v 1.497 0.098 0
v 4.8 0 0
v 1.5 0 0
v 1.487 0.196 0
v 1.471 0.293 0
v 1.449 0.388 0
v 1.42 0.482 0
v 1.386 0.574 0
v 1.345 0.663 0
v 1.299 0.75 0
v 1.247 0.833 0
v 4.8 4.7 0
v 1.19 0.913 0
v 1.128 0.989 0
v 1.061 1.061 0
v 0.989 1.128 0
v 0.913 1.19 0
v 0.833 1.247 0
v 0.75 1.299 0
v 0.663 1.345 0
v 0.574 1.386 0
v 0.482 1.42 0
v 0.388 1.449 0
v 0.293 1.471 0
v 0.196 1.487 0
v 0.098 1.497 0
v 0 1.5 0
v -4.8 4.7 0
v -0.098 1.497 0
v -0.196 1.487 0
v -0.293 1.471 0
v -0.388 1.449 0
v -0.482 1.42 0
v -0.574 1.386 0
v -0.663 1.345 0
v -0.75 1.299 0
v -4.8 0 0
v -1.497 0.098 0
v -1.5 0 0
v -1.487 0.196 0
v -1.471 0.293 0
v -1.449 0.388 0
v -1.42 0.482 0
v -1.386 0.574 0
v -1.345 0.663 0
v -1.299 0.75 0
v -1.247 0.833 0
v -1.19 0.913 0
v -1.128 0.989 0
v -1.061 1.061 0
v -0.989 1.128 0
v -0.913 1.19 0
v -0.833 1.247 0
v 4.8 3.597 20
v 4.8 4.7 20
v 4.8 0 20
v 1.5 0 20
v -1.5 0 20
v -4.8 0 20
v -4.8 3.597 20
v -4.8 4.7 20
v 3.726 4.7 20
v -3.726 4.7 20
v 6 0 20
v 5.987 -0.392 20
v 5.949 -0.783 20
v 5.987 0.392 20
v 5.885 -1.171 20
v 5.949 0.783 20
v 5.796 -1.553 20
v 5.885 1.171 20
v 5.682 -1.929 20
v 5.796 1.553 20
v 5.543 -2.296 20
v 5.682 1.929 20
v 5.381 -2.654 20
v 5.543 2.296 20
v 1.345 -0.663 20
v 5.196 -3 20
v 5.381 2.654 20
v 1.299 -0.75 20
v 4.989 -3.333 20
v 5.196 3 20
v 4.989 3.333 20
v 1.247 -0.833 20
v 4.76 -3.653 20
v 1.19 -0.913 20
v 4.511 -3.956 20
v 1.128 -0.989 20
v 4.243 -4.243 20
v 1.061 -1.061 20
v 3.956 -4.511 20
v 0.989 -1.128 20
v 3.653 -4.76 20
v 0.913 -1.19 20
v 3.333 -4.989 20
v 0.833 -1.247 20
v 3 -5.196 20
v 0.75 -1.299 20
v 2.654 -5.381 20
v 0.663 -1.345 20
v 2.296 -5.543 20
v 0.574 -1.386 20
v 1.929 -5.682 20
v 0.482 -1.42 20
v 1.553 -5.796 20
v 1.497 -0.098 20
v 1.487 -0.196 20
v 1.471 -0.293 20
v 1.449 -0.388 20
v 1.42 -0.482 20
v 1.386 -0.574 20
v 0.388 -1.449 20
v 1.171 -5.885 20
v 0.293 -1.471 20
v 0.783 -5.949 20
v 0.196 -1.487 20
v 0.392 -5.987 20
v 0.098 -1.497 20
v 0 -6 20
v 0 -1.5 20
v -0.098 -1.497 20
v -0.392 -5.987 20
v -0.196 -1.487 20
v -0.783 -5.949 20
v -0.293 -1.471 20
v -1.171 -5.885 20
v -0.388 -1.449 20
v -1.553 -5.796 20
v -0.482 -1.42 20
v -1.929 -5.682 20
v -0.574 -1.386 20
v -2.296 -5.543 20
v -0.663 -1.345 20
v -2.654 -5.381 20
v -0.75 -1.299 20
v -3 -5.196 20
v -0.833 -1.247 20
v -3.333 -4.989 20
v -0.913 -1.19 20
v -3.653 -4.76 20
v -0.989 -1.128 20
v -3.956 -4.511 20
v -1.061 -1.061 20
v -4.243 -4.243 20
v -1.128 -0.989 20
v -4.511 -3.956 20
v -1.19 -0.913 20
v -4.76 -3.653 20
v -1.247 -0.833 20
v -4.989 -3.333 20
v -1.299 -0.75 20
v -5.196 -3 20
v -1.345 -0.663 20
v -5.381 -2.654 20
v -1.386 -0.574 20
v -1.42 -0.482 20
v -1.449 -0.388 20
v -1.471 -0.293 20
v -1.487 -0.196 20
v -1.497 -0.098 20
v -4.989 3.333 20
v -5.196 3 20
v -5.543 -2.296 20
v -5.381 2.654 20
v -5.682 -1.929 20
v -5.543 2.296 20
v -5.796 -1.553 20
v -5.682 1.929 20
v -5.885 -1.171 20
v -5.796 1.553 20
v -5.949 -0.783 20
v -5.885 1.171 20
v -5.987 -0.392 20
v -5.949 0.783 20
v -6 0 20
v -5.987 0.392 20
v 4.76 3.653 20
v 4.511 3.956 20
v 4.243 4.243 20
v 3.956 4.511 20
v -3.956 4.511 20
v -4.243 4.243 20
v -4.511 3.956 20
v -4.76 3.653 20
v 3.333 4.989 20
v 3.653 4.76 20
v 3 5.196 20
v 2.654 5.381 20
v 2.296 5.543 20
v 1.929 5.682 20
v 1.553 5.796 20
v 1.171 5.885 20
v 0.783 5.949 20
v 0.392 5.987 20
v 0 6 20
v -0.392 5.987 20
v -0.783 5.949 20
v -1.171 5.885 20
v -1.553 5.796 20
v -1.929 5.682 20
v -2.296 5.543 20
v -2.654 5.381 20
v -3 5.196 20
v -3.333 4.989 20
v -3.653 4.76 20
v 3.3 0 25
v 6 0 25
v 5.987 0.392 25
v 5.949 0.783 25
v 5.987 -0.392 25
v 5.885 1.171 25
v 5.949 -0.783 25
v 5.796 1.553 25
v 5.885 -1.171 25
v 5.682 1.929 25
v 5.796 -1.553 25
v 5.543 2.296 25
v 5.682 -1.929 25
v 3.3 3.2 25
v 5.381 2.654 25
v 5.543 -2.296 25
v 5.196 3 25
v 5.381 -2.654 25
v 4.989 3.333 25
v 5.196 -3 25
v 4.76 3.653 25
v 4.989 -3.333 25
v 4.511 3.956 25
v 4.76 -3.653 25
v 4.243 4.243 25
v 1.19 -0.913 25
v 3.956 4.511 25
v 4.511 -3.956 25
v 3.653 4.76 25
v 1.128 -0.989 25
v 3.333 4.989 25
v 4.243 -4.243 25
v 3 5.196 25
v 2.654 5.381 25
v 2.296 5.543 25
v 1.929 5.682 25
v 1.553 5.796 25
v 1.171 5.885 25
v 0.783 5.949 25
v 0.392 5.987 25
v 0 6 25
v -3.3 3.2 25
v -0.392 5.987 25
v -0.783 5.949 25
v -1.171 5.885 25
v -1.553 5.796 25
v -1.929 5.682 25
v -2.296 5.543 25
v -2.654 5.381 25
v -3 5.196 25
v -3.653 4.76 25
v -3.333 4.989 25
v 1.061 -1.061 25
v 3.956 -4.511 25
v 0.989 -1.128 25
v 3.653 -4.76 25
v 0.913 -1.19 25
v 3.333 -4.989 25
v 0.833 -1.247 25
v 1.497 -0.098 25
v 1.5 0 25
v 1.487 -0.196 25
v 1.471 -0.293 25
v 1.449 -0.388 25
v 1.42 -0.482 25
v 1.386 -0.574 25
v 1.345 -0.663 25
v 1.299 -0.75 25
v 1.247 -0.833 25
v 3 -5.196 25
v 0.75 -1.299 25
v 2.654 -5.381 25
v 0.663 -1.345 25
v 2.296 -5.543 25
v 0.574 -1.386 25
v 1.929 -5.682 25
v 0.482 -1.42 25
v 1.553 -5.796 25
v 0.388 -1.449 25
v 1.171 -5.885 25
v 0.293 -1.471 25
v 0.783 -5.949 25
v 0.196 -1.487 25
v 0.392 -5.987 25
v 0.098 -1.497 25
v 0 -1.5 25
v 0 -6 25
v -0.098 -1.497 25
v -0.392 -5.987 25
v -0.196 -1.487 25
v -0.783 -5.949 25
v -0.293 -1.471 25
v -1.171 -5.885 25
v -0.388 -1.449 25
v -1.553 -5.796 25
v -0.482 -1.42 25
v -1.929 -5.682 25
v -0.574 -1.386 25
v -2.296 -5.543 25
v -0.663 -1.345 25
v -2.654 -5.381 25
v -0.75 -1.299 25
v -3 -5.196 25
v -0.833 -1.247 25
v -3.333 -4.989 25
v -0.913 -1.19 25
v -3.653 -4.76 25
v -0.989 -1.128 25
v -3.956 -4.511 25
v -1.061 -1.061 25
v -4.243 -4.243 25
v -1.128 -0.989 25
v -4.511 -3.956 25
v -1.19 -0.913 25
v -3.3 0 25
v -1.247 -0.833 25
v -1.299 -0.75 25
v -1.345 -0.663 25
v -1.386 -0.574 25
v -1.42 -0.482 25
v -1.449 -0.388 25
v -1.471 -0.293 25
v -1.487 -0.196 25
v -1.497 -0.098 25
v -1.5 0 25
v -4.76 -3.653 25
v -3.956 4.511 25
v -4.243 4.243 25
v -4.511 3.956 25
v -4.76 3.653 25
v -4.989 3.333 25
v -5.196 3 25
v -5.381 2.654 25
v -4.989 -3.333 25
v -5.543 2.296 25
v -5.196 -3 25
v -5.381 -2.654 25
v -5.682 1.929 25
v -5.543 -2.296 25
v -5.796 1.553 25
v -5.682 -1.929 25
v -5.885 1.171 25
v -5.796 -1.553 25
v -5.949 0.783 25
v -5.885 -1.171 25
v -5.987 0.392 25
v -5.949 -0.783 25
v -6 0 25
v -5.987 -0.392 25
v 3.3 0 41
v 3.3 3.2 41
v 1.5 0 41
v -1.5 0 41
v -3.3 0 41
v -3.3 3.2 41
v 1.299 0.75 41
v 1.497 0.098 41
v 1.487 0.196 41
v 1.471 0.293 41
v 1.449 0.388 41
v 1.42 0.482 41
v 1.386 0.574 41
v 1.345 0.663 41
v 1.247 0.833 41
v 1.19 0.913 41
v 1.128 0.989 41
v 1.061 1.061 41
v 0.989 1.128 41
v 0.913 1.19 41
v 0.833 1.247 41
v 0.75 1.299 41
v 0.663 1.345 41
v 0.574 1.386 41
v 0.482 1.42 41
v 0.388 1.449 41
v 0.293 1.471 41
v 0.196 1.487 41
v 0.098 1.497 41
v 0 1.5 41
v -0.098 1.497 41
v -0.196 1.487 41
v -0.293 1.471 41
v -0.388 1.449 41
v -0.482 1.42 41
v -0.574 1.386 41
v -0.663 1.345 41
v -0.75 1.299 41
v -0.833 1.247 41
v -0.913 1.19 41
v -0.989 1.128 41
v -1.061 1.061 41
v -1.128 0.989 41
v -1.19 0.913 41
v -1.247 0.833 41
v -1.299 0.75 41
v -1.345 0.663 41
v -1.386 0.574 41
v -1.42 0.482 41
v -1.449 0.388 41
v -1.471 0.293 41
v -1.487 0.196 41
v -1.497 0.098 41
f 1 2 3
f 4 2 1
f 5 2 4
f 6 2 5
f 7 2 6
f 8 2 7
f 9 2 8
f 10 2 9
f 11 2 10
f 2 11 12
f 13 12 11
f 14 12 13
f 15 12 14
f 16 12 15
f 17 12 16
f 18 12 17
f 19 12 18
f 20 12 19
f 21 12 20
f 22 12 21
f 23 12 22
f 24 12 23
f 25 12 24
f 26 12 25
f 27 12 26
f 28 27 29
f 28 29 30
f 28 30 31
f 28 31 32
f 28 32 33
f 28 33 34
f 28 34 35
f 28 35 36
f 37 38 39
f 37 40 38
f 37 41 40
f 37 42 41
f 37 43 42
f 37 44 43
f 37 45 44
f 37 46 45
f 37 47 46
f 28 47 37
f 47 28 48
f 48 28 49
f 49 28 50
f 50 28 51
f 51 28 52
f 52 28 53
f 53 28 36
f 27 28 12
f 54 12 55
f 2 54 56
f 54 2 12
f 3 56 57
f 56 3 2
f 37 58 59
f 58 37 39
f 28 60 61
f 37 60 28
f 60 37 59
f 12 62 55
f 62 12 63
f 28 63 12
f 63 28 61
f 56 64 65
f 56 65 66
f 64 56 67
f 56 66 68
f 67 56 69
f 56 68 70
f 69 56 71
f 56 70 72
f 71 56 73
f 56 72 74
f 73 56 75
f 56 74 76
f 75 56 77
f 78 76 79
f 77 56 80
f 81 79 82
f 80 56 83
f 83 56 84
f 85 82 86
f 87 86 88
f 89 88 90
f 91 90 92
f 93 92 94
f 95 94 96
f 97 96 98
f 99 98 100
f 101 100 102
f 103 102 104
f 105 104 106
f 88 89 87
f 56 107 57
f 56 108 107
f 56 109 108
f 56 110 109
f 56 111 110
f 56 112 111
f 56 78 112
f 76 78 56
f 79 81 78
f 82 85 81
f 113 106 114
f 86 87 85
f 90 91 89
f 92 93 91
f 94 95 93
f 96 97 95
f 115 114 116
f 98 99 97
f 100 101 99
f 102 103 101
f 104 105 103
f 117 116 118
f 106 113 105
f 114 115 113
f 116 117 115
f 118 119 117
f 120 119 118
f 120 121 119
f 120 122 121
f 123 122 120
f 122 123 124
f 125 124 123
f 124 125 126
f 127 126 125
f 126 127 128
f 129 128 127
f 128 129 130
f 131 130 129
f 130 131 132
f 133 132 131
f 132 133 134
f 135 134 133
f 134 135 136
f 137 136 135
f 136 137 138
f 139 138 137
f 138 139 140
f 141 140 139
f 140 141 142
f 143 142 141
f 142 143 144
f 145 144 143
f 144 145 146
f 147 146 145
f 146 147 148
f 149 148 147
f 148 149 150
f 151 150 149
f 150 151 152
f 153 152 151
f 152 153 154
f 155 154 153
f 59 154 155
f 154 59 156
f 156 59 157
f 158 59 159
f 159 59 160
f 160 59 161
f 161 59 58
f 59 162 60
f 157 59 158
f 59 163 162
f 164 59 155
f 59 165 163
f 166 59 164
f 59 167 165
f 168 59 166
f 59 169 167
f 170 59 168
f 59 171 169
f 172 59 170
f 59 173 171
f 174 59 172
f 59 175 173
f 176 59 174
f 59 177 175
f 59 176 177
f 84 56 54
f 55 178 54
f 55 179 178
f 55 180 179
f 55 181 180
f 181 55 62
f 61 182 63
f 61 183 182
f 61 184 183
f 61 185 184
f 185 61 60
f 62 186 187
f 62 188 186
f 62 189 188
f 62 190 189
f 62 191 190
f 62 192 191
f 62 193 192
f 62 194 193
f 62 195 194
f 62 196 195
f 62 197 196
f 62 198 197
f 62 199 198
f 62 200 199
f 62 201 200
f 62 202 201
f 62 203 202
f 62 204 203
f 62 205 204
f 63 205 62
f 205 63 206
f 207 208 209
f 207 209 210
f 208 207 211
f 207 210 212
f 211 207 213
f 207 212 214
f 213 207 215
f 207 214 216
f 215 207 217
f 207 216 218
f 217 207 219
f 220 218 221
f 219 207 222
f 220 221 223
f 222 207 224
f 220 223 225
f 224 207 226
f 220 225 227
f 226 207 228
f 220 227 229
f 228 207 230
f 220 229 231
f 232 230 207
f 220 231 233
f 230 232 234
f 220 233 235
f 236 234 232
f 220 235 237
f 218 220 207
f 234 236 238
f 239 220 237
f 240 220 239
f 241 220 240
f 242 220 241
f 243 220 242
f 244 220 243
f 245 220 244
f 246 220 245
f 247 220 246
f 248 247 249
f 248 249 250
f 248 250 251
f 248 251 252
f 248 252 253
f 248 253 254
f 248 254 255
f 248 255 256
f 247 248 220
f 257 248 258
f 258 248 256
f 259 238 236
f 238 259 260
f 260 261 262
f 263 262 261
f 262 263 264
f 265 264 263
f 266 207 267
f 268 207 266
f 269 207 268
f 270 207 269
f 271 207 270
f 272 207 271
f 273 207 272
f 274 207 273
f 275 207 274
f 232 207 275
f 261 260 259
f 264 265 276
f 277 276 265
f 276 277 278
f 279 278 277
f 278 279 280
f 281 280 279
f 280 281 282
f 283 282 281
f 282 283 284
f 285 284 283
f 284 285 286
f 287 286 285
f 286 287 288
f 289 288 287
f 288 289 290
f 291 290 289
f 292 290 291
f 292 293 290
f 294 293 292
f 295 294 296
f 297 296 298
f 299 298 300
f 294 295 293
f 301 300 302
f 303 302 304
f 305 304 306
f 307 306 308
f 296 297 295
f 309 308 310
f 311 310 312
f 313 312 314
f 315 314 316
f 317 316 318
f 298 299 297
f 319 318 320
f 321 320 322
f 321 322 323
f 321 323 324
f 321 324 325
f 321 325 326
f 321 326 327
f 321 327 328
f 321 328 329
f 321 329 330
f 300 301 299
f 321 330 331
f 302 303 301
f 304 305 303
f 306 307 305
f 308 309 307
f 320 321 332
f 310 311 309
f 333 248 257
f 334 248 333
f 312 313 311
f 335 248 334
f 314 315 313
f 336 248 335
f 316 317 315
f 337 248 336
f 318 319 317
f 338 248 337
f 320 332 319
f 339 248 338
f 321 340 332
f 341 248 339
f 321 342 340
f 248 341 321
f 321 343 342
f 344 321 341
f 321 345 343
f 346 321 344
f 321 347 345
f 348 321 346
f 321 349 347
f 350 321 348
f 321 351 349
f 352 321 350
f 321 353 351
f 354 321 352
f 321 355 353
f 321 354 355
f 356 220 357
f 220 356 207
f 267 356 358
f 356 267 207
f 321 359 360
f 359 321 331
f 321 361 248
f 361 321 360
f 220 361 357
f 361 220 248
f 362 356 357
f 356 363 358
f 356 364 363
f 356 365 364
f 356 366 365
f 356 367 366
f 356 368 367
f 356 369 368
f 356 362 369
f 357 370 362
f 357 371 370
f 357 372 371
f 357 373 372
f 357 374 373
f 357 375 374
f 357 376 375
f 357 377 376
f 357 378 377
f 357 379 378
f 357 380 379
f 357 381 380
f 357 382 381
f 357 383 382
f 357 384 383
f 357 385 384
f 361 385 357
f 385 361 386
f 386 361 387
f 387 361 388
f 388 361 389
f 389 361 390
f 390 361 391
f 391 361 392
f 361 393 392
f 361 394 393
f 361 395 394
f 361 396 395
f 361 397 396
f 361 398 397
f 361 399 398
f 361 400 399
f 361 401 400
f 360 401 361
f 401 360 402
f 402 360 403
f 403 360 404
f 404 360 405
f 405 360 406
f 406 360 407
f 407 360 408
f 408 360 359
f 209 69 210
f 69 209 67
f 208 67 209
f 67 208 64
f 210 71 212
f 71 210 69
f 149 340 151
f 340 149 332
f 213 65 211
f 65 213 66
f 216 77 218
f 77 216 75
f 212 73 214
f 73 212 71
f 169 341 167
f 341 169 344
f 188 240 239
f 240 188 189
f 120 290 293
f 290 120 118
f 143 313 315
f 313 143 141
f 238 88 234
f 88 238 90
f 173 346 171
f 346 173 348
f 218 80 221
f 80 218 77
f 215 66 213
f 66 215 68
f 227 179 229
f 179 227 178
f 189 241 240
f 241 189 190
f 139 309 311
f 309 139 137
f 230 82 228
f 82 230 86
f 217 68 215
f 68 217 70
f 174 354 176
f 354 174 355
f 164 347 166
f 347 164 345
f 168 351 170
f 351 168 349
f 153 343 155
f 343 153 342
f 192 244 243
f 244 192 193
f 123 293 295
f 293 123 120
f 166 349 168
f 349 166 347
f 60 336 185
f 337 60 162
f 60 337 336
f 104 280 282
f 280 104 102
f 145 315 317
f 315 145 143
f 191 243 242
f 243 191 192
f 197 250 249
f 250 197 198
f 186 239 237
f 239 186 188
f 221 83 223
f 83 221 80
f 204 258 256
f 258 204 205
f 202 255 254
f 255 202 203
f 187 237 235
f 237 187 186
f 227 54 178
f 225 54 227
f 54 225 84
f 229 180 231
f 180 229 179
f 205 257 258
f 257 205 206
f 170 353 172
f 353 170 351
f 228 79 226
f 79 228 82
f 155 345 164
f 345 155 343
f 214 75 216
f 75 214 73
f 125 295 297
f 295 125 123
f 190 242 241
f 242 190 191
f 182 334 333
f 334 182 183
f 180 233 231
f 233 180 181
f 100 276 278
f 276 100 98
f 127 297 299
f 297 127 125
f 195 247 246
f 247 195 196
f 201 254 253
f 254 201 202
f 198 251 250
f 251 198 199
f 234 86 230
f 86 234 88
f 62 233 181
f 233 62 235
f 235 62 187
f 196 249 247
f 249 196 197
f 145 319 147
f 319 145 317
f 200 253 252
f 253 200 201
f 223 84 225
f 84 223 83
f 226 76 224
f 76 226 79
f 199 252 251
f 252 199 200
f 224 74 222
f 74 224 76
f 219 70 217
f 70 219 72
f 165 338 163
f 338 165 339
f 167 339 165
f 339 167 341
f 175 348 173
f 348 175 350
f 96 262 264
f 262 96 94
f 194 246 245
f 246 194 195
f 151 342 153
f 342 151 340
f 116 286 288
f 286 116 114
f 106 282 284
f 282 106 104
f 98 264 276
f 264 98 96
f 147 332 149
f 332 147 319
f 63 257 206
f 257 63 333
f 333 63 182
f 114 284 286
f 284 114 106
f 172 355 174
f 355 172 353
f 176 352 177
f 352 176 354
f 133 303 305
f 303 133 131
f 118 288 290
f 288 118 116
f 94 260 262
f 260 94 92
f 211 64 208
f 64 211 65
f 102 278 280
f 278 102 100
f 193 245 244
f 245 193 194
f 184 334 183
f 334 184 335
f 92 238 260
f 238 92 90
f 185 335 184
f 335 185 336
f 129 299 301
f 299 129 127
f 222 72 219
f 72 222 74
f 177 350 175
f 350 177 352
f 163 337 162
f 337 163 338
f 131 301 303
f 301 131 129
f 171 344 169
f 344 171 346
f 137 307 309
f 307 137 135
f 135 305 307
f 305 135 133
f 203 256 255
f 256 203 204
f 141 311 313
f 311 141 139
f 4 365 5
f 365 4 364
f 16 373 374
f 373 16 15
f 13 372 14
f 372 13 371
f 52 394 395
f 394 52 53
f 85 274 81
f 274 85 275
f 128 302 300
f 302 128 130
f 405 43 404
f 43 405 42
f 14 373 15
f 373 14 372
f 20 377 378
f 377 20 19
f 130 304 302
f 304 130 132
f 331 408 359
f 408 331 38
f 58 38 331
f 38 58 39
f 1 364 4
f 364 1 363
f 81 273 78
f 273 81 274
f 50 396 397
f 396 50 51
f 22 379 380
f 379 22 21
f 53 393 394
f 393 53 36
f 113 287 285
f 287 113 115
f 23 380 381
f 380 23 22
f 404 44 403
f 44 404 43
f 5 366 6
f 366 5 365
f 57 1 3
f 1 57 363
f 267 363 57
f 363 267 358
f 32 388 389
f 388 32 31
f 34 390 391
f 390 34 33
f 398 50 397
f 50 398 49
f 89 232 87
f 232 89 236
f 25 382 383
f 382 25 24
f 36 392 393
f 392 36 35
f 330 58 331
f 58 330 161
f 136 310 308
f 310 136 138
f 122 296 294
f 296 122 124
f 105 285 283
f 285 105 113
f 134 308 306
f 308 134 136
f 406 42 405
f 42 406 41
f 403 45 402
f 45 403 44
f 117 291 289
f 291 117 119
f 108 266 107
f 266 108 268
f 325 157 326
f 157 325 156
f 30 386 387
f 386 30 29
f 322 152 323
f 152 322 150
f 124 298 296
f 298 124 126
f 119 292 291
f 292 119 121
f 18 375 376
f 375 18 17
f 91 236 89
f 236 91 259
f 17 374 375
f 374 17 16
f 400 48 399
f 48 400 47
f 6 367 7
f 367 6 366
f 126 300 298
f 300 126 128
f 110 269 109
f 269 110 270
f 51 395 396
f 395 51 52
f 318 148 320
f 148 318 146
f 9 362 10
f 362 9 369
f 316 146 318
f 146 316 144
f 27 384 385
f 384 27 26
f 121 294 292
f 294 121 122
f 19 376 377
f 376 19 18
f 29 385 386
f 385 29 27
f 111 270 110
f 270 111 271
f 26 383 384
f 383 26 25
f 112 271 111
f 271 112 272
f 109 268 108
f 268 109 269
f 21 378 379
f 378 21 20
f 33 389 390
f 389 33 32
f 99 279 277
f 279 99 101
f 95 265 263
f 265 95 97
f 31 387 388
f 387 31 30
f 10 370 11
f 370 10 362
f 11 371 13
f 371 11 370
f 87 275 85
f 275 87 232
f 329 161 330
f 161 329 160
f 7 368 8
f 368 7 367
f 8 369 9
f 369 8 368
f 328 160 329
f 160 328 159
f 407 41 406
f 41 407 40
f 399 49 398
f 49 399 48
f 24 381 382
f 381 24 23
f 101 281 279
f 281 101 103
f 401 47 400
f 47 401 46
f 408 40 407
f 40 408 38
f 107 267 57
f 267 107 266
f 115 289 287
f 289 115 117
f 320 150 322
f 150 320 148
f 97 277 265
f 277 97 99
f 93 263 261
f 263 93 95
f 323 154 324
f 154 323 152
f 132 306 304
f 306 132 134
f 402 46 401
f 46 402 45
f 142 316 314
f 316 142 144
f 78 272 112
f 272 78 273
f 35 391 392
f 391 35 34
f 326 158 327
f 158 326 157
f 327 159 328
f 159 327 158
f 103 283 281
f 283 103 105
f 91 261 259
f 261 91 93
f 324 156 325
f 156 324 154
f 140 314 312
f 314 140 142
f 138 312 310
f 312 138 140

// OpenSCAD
// Straight hose-barb reducer: 8 mm tubing (barbs) -> 5 mm tubing (barbs)
// Print orientation: standing upright along Z, centred on origin in X/Y

// ---------------- Parameters ----------------
tube_d1      = 8;    // inner diameter of the larger tubing
tube_d2      = 5;    // inner diameter of the smaller tubing
bore_d       = 3;    // through-bore diameter (full length)

z_barb1_h    = 20;   // height of the 8 mm barbs (z = 0 .. 20)
z_barb1_od0  = 7.5;  // outer diameter of 8 mm barbs at bottom
z_barb1_od1  = 9.5;  // outer diameter of 8 mm barbs at top

z_collar_h   = 5;    // height of the cylindrical collar (z = 20 .. 25)
z_collar_d   = 12;   // outer diameter of the collar

z_barb2_h    = 16;   // height of the 5 mm barbs (z = 25 .. 41)
z_barb2_od0  = 6.5;  // outer diameter of 5 mm barbs at bottom
z_barb2_od1  = 5.0;  // outer diameter of 5 mm barbs at top

eps          = 0.5;  // overshoot for clean boolean cuts
$fn          = 96;   // curve resolution

// ---------------- Derived ----------------
tube_r1 = tube_d1 / 2 + 0.8;  // 8 mm barb outer radius at 3 mm bore
tube_r2 = tube_d2 / 2 + 0.8;  // 5 mm barb outer radius at 3 mm bore
collar_r = z_collar_d / 2;

// ---------------- Model ----------------
difference() {
    union() {
        // 8 mm barbs: sawtooth profile, stacked (two identical)
        for (i = [0 : 1])
            translate([0, 0, i * z_barb1_h / 2])
                linear_extrude(height = z_barb1_h / 2)
                    polygon([
                        [-tube_r1, 0],
                        [ tube_r1, 0],
                        [ tube_r1, z_barb1_od1 - tube_r1],  // top outer corner
                        [-tube_r1, z_barb1_od1 - tube_r1]
                    ]);

        // Cylindrical collar (z = 20 .. 25)
        translate([0, 0, z_barb1_h])
            cylinder(h = z_collar_h, r = collar_r);

        // 5 mm barbs: tapered then stepped back out, stacked (two identical)
        for (i = [0 : 1])
            translate([0, 0, z_barb1_h + z_collar_h + i * z_barb2_h / 2])
                linear_extrude(height = z_barb2_h / 2)
                    polygon([
                        [-tube_r2, 0],
                        [ tube_r2, 0],
                        [ tube_r2, z_barb2_od0 - tube_r2],  // bottom outer corner
                        [ z_barb2_od1 - tube_r2, z_barb2_od0 - tube_r2],  // top outer corner
                        [-z_barb2_od1 + tube_r2, z_barb2_od0 - tube_r2],
                        [-tube_r2, z_barb2_od0 - tube_r2]
                    ]);
    }

    // Full-length 3 mm bore
    translate([0, 0, -eps])
        cylinder(h = z_barb1_h + z_collar_h + z_barb2_h + 2 * eps, d = bore_d);
}
